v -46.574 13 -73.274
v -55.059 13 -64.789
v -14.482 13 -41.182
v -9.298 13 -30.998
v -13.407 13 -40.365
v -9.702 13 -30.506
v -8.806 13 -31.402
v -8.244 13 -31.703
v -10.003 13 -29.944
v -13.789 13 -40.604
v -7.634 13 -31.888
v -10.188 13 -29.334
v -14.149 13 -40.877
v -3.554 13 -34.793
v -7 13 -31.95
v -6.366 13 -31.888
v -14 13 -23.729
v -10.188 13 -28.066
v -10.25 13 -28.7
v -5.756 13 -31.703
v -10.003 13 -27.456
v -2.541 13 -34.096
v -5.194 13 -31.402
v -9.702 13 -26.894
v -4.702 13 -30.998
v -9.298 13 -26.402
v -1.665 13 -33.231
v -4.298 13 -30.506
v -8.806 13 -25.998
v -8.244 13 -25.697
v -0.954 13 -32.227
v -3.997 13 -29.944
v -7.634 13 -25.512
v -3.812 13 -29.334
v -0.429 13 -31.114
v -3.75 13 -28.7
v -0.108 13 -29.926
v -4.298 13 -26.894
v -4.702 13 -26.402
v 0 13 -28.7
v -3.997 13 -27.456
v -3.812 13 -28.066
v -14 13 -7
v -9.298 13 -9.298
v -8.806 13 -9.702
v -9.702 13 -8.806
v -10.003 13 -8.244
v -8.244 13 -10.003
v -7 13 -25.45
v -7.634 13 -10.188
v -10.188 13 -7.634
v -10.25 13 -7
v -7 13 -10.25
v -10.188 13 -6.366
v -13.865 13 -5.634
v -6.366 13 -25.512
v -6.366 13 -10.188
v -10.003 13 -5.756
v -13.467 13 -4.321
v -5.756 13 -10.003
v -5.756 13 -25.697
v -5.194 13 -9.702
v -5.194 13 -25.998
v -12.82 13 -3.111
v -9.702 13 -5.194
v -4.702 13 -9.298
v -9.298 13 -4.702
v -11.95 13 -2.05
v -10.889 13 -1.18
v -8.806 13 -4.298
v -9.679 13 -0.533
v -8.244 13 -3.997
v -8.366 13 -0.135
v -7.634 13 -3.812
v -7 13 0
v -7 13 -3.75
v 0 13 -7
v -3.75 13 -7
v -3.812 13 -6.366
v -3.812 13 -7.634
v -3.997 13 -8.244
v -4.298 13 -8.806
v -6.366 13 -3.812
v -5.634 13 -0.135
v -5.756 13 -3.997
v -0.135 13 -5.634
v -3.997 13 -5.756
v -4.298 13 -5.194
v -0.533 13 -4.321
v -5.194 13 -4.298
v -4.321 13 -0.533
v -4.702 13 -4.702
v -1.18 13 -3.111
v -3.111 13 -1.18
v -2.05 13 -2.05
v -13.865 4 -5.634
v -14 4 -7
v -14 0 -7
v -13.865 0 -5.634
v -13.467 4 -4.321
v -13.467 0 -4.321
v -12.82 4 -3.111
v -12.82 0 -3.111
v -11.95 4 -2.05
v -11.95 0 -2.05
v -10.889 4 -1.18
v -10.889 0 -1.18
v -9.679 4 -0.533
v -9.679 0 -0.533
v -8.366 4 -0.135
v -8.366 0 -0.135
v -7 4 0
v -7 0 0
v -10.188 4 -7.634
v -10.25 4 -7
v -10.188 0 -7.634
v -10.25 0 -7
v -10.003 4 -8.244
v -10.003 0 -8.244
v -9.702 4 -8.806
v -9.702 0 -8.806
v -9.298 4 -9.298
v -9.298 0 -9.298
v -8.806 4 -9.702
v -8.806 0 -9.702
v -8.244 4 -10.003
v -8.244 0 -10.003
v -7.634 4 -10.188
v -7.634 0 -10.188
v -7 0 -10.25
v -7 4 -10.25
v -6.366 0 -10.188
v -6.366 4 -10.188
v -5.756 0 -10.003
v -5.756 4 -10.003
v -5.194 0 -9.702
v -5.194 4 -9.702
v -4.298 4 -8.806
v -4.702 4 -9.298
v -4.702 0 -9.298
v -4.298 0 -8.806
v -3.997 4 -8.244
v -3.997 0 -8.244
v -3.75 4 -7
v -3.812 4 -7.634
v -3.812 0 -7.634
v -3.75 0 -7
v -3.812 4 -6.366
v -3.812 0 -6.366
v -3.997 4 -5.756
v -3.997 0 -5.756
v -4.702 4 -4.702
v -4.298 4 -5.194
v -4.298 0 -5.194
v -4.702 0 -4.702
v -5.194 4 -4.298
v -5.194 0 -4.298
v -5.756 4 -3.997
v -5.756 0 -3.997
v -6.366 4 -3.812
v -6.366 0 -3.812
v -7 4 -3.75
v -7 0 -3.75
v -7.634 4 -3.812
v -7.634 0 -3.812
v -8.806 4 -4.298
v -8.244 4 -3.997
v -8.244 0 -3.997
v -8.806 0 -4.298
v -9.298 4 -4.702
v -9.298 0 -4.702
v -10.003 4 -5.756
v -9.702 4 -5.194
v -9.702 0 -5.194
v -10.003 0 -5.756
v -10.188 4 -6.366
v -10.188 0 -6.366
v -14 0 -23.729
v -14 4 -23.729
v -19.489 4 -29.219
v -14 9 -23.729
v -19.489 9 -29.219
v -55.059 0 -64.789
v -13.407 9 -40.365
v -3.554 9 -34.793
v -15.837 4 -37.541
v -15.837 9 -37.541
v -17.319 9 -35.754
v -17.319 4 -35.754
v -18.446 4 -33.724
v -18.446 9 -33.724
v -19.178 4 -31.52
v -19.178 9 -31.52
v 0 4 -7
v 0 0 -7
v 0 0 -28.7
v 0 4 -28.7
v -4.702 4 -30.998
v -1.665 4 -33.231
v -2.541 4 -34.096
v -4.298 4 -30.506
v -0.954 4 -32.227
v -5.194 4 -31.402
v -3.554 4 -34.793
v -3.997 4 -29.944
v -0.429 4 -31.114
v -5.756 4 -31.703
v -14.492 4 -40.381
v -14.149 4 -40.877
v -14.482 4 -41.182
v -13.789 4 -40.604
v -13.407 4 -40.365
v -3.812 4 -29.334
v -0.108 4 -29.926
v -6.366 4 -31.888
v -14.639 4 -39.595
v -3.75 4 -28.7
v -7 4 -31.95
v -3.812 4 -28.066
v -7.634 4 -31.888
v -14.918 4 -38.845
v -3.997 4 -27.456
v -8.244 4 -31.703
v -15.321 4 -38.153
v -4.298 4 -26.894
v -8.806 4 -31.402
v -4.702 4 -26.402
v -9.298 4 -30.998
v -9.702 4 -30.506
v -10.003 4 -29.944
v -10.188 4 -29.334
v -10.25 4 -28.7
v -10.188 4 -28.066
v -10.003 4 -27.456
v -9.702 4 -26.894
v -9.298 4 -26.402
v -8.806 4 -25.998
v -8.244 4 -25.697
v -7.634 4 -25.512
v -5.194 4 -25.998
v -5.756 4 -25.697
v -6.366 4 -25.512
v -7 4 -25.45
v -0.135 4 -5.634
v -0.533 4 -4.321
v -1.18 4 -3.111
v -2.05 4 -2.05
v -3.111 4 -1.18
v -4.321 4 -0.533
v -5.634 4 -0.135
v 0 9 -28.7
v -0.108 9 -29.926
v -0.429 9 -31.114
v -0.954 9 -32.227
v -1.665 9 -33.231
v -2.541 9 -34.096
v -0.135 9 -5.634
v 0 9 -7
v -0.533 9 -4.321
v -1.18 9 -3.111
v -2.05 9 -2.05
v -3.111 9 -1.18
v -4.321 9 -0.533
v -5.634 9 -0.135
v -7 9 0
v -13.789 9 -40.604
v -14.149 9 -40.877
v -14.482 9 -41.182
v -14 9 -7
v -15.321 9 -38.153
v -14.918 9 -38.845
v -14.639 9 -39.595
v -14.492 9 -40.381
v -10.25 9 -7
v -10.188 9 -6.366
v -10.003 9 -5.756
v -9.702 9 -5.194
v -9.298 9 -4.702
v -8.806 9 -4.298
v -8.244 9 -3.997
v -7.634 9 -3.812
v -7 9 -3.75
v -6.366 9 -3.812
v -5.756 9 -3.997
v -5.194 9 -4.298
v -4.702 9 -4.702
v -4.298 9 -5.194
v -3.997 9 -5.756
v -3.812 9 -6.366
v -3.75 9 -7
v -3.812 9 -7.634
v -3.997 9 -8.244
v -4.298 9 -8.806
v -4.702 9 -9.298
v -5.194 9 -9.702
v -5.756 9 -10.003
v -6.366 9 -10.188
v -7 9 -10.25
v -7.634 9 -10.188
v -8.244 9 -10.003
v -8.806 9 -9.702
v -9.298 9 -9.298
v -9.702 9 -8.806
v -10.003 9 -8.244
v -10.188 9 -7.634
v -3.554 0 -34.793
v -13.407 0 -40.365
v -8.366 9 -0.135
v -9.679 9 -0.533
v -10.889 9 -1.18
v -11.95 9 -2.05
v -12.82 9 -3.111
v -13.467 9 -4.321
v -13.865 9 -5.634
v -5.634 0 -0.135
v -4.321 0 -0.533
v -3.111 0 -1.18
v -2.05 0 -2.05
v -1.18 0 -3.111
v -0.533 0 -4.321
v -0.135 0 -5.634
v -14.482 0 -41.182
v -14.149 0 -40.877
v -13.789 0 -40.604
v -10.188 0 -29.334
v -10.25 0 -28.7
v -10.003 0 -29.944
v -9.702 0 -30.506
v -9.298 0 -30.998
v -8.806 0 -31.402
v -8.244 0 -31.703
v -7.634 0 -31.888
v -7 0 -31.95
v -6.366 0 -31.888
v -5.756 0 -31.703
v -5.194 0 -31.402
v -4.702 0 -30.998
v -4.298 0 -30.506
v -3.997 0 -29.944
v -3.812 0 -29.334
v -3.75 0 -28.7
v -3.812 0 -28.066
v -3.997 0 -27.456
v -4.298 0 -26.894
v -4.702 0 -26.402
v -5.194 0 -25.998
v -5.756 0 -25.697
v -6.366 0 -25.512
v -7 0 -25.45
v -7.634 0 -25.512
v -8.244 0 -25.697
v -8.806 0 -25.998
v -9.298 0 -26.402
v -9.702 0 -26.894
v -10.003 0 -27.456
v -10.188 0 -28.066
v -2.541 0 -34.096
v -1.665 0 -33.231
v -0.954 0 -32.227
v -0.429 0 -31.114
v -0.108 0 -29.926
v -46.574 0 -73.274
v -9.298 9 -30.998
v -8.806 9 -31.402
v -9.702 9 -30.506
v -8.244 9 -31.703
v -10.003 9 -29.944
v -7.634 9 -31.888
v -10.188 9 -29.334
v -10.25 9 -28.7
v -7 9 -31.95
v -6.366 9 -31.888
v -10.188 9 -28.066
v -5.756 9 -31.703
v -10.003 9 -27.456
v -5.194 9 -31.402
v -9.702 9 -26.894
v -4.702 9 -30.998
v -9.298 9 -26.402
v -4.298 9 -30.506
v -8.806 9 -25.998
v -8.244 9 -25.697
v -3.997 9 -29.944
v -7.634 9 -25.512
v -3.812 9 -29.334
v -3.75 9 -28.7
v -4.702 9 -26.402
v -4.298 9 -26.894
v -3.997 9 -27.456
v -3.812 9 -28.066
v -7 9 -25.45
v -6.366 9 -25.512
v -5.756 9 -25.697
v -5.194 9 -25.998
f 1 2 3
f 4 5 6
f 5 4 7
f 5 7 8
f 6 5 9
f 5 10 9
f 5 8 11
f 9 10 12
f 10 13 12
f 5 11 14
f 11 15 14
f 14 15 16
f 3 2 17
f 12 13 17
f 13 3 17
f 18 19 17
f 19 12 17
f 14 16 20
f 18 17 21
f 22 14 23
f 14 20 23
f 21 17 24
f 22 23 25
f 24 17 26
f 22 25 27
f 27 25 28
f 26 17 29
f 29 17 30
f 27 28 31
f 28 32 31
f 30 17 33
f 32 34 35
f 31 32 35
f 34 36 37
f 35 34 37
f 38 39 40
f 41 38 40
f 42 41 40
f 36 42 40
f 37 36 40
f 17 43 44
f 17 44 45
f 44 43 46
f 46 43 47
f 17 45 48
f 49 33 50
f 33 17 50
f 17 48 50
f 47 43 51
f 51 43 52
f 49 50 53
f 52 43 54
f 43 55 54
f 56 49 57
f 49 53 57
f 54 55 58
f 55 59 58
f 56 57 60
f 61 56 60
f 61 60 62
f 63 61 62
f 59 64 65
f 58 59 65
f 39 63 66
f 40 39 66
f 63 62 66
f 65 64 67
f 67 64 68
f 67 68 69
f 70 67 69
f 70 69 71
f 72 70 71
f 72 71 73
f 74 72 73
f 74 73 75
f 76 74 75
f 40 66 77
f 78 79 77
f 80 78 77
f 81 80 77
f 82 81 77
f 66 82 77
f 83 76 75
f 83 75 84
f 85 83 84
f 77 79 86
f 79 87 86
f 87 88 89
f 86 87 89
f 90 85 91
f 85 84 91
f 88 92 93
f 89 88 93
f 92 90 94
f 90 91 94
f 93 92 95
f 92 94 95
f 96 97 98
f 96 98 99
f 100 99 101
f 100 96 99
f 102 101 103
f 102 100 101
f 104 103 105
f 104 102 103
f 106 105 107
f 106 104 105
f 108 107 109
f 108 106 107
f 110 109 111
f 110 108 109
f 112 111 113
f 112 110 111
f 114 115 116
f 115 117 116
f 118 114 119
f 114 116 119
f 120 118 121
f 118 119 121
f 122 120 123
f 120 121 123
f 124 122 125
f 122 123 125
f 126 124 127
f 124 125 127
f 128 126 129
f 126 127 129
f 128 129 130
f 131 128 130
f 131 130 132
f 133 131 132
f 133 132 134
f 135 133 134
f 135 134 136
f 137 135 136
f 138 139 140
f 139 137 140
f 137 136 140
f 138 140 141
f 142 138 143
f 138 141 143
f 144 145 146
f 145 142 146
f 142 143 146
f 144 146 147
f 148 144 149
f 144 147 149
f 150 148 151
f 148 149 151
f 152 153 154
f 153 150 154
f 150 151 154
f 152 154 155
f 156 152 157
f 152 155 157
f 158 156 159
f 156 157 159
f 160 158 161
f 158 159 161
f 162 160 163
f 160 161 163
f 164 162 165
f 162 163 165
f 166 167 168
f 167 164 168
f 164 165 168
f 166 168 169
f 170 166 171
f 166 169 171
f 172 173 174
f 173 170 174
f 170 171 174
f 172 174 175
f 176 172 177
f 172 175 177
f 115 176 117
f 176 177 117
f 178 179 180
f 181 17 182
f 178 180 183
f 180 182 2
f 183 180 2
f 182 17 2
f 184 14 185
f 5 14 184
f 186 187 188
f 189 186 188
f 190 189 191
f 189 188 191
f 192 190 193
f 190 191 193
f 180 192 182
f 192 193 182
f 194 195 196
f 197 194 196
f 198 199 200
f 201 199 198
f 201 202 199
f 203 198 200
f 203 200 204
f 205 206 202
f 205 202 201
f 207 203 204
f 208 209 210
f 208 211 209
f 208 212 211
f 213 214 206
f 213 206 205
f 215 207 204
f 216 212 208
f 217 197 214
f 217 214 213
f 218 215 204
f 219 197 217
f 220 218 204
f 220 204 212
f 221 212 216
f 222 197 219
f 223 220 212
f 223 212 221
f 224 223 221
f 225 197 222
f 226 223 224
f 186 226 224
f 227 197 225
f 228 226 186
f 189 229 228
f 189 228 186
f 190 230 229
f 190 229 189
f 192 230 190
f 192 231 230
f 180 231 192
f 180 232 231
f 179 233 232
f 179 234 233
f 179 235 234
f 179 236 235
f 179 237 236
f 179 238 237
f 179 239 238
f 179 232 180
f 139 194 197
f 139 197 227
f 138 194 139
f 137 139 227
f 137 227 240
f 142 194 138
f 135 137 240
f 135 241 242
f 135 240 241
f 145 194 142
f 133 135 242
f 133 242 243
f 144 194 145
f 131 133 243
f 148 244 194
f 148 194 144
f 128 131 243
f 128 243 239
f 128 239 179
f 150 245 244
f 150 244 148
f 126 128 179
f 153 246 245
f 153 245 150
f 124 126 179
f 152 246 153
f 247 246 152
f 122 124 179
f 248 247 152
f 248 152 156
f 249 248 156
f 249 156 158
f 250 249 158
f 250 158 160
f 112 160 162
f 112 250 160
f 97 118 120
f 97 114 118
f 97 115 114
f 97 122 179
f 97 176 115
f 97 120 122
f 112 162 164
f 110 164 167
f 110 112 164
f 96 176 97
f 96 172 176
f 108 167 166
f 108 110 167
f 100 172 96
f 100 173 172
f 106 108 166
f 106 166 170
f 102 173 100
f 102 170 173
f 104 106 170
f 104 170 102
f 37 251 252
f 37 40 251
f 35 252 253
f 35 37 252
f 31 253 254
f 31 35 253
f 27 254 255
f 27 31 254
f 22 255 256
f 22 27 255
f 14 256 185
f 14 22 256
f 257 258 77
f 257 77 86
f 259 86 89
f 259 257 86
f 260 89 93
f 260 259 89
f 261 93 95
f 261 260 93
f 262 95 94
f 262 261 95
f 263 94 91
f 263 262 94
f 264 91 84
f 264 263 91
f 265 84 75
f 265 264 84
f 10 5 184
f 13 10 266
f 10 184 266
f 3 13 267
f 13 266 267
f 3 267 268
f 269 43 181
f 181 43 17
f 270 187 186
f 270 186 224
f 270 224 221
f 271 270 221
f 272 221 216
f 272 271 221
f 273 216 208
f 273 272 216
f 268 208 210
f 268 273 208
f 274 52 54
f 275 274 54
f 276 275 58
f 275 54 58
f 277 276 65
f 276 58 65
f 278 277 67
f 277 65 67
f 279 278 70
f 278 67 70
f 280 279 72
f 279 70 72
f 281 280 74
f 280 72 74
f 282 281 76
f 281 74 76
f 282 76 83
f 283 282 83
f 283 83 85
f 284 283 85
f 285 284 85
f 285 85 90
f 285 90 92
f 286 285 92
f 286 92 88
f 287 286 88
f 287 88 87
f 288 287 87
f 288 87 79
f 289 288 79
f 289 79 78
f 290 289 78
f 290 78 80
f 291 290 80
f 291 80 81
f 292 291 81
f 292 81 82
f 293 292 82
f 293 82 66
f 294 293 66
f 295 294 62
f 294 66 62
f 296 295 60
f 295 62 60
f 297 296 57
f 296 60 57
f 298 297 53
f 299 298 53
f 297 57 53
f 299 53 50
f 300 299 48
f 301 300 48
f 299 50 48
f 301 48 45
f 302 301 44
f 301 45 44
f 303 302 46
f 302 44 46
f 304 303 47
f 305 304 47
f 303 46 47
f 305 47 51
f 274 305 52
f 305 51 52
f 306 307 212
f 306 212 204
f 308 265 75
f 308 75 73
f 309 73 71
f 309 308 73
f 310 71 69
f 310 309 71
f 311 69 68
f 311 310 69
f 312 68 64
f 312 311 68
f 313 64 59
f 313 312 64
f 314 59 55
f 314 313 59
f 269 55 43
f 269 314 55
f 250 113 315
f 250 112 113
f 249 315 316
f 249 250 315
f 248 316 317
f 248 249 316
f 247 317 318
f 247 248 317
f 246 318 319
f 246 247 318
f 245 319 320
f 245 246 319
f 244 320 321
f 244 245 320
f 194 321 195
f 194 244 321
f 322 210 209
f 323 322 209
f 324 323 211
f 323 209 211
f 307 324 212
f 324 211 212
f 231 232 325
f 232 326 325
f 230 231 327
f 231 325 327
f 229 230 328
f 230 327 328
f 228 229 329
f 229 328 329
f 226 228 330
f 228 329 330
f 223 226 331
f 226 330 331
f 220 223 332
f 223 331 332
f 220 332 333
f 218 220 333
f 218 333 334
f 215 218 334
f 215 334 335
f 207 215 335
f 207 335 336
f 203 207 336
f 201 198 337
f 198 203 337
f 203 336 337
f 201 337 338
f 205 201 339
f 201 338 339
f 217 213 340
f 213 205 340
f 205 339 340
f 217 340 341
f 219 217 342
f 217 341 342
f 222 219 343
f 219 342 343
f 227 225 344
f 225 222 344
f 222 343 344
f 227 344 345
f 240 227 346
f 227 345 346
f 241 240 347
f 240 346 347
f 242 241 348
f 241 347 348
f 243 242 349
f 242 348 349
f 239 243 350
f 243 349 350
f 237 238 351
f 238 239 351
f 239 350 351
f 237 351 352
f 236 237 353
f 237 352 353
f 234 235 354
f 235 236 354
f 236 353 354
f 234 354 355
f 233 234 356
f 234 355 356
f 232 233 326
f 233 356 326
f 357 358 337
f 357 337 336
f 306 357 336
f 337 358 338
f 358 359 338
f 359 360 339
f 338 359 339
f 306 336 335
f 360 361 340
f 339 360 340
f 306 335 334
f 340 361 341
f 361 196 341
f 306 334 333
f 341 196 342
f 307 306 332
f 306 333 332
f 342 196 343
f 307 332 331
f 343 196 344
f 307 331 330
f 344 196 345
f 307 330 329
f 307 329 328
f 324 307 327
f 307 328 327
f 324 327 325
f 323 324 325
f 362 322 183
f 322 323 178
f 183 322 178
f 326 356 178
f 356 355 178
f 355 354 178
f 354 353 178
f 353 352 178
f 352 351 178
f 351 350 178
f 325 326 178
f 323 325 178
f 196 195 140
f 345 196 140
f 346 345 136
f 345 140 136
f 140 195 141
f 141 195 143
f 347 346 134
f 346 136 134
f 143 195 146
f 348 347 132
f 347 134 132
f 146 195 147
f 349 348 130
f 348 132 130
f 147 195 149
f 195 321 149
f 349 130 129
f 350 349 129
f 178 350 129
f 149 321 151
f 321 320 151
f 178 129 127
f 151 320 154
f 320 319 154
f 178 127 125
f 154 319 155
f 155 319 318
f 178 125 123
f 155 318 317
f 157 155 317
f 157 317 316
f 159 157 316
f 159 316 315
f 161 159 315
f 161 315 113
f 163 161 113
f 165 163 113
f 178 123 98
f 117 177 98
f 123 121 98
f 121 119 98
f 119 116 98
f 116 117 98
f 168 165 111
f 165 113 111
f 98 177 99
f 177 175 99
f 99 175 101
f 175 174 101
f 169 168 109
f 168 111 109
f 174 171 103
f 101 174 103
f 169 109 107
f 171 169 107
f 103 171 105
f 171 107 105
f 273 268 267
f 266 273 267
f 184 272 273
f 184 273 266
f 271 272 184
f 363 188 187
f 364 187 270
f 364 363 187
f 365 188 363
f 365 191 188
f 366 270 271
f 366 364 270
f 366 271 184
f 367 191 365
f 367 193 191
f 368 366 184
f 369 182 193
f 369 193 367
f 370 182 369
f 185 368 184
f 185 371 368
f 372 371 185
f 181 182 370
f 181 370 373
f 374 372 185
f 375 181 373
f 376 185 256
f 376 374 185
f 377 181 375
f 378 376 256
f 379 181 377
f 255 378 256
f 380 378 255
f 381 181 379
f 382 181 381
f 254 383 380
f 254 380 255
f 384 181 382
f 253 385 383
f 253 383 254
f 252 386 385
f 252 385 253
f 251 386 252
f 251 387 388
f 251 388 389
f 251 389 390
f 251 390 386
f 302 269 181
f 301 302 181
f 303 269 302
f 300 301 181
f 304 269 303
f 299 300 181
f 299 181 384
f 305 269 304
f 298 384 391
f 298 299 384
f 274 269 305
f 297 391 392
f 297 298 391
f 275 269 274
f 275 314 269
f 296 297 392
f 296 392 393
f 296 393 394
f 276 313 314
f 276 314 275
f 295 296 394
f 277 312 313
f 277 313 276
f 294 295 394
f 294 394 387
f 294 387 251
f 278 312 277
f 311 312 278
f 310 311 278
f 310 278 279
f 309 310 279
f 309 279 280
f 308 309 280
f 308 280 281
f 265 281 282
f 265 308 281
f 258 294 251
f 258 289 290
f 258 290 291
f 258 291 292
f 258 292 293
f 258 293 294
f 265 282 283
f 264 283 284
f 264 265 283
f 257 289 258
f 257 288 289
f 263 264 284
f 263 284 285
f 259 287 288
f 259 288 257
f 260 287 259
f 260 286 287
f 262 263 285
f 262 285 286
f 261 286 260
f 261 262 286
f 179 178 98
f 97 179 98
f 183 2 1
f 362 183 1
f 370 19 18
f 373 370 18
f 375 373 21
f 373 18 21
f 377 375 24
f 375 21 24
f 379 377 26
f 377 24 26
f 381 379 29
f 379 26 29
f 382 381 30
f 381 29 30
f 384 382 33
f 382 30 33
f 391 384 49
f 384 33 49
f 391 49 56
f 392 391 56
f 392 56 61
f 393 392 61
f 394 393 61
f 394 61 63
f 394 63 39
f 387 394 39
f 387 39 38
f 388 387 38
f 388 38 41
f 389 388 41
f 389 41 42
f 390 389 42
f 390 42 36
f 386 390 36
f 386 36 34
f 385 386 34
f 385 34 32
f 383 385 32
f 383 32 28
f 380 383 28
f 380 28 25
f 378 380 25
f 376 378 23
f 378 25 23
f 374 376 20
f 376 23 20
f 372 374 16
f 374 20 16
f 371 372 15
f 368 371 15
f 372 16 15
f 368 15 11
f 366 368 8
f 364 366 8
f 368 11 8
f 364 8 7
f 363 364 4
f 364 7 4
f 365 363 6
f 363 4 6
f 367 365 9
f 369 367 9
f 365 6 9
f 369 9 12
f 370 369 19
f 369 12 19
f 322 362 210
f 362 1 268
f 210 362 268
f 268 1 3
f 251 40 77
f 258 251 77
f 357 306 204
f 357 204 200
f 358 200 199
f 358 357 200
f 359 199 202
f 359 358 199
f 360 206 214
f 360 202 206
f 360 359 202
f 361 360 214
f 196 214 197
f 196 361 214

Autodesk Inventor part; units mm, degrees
ref_plane "YZ Plane" through (0, 0, 0) normal (1, 0, 0) x (0, 1, 0)
ref_plane "XZ Plane" through (0, 0, 0) normal (0, 1, 0) x (-1, 0, 0)
ref_plane "XY Plane" through (0, 0, 0) normal (0, 0, 1) x (1, 0, 0)
sketch "Sketch1" plane through (0, 0, 0) normal (0, 1, 0) x (-1, 0, 0)
  line L0 (14, 0) -> (0, 0)
  line L1 (0, 0) -> (0, -35.7)
  line L2 (0, -35.7) -> (14, -35.7)
  line L3 (14, -35.7) -> (14, 0)
  circle A0 centre (7, -7) radius 3.25
  circle A1 centre (7, -28.7) radius 3.25
  arc A2 (14, -7) -> (0, -7) centre (7, -7) ccw
  line L4 (14, -35.7) -> (14, -40.7)
  line L5 (14, -40.7) -> (8.75, -40.7)
  line L6 (5.25, -40.7) -> (0, -40.7)
  line L7 (0, -40.7) -> (0, -35.7)
  line L8 (8.75, -40.7) -> (5.25, -40.7)
  line L9 (14, -40.7) -> (46.5741, -73.2741)
  line L10 (46.5741, -73.2741) -> (55.0594, -64.7888)
  line L11 (55.0594, -64.7888) -> (14, -23.7294)
  circle A3 centre (7, -28.7) radius 7
  line L12 (14, -40.7) -> (3.5544, -34.7933)
  point P0 (7, -35.7)
  point P1 (11.375, -40.7)
  point P2 (7, 0)
  point P3 (0, -28.7)
  dimension "d0" = 6.5
  dimension "d1" = 21.7
  dimension "d2" = 7
  dimension "d3" = 7
  dimension "d4" = 14
  dimension "d9" = 5
  dimension "d20" = 12
  dimension "d21" = 135
extrude "Extrusion1" add sketch "Sketch1" along normal blind 4 contours L3 A2 L0 | A2 L1 L0 | A2 L3 A3 L1 | L11 L10 L9 L4 L3 | A3 | L3 L2 A3 | A3 L2 L12 | L4 L12 L2
fillet "Fillet1" radius 5 1 edges at (-14, 2, -40.7)
sketch "Sketch3" plane through (0, 4, 0) normal (0, 1, 0) x (1, 0, 0)
  line L0 (-14, 0) -> (0, 0) projected
  line L1 (0, 0) -> (0, 28.7) projected
  arc A0 (0, 28.7) -> (-3.5544, 34.7933) centre (-7, 28.7) ccw projected
  line L2 (-3.5544, 34.7933) -> (-13.4072, 40.3648) projected
  arc A1 (-14.4816, 41.1816) -> (-13.4072, 40.3648) centre (-10.946, 44.7171) ccw projected
  line L3 (-14.4816, 41.1816) -> (-46.5741, 73.2741) projected
  line L4 (-46.5741, 73.2741) -> (-55.0594, 64.7888) projected
  line L5 (-55.0594, 64.7888) -> (-14, 23.7294) projected
  line L6 (-14, 23.7294) -> (-14, 0) projected
  circle A2 centre (-7, 7) radius 3.25 projected
  circle A3 centre (-7, 28.7) radius 3.25 projected
  circle A4 centre (-7, 28.7) radius 7
  line L7 (-14, 23.7294) -> (-9.3072, 22.0912)
  line L8 (-14, 23.7294) -> (-14, 28.7)
  line L9 (-14.4816, 41.1816) -> (-21.444, 48.144)
  circle A5 centre (-7, 28.7) radius 12.5
  arc A6 (-15.8366, 37.541) -> (-14.4816, 41.1816) centre (-19.1353, 40.8413) ccw
  point P0 (-3.5544, 34.7933)
  point P1 (-11.499, 34.0628)
  point P2 (-3.5544, 34.7933)
  point P3 (-19.4892, 29.2187)
  point P4 (-15.8366, 37.541)
  point P5 (-14.1011, 40.8383)
  point P6 (0, 18.3438)
  point P7 (-12.5691, 39.8909)
  point P8 (-14, 18.3438)
  dimension "d24" = 25
extrude "Extrusion4" add sketch "Sketch3" along normal blind 2.5 contours L5 L4 L3 A6 A5
mirror "Mirror3" about plane through (-34.7643, 6.5, -51.2464) normal (0, 1, 0) of "Extrusion4", "Fillet1", "Extrusion1"
fillet "Fillet3" radius 7 4 edges at (0, 11, 0) (-14, 11, 0) (-14, 2, 0) (0, 2, 0)
properties part number "R2_3DPrint"
